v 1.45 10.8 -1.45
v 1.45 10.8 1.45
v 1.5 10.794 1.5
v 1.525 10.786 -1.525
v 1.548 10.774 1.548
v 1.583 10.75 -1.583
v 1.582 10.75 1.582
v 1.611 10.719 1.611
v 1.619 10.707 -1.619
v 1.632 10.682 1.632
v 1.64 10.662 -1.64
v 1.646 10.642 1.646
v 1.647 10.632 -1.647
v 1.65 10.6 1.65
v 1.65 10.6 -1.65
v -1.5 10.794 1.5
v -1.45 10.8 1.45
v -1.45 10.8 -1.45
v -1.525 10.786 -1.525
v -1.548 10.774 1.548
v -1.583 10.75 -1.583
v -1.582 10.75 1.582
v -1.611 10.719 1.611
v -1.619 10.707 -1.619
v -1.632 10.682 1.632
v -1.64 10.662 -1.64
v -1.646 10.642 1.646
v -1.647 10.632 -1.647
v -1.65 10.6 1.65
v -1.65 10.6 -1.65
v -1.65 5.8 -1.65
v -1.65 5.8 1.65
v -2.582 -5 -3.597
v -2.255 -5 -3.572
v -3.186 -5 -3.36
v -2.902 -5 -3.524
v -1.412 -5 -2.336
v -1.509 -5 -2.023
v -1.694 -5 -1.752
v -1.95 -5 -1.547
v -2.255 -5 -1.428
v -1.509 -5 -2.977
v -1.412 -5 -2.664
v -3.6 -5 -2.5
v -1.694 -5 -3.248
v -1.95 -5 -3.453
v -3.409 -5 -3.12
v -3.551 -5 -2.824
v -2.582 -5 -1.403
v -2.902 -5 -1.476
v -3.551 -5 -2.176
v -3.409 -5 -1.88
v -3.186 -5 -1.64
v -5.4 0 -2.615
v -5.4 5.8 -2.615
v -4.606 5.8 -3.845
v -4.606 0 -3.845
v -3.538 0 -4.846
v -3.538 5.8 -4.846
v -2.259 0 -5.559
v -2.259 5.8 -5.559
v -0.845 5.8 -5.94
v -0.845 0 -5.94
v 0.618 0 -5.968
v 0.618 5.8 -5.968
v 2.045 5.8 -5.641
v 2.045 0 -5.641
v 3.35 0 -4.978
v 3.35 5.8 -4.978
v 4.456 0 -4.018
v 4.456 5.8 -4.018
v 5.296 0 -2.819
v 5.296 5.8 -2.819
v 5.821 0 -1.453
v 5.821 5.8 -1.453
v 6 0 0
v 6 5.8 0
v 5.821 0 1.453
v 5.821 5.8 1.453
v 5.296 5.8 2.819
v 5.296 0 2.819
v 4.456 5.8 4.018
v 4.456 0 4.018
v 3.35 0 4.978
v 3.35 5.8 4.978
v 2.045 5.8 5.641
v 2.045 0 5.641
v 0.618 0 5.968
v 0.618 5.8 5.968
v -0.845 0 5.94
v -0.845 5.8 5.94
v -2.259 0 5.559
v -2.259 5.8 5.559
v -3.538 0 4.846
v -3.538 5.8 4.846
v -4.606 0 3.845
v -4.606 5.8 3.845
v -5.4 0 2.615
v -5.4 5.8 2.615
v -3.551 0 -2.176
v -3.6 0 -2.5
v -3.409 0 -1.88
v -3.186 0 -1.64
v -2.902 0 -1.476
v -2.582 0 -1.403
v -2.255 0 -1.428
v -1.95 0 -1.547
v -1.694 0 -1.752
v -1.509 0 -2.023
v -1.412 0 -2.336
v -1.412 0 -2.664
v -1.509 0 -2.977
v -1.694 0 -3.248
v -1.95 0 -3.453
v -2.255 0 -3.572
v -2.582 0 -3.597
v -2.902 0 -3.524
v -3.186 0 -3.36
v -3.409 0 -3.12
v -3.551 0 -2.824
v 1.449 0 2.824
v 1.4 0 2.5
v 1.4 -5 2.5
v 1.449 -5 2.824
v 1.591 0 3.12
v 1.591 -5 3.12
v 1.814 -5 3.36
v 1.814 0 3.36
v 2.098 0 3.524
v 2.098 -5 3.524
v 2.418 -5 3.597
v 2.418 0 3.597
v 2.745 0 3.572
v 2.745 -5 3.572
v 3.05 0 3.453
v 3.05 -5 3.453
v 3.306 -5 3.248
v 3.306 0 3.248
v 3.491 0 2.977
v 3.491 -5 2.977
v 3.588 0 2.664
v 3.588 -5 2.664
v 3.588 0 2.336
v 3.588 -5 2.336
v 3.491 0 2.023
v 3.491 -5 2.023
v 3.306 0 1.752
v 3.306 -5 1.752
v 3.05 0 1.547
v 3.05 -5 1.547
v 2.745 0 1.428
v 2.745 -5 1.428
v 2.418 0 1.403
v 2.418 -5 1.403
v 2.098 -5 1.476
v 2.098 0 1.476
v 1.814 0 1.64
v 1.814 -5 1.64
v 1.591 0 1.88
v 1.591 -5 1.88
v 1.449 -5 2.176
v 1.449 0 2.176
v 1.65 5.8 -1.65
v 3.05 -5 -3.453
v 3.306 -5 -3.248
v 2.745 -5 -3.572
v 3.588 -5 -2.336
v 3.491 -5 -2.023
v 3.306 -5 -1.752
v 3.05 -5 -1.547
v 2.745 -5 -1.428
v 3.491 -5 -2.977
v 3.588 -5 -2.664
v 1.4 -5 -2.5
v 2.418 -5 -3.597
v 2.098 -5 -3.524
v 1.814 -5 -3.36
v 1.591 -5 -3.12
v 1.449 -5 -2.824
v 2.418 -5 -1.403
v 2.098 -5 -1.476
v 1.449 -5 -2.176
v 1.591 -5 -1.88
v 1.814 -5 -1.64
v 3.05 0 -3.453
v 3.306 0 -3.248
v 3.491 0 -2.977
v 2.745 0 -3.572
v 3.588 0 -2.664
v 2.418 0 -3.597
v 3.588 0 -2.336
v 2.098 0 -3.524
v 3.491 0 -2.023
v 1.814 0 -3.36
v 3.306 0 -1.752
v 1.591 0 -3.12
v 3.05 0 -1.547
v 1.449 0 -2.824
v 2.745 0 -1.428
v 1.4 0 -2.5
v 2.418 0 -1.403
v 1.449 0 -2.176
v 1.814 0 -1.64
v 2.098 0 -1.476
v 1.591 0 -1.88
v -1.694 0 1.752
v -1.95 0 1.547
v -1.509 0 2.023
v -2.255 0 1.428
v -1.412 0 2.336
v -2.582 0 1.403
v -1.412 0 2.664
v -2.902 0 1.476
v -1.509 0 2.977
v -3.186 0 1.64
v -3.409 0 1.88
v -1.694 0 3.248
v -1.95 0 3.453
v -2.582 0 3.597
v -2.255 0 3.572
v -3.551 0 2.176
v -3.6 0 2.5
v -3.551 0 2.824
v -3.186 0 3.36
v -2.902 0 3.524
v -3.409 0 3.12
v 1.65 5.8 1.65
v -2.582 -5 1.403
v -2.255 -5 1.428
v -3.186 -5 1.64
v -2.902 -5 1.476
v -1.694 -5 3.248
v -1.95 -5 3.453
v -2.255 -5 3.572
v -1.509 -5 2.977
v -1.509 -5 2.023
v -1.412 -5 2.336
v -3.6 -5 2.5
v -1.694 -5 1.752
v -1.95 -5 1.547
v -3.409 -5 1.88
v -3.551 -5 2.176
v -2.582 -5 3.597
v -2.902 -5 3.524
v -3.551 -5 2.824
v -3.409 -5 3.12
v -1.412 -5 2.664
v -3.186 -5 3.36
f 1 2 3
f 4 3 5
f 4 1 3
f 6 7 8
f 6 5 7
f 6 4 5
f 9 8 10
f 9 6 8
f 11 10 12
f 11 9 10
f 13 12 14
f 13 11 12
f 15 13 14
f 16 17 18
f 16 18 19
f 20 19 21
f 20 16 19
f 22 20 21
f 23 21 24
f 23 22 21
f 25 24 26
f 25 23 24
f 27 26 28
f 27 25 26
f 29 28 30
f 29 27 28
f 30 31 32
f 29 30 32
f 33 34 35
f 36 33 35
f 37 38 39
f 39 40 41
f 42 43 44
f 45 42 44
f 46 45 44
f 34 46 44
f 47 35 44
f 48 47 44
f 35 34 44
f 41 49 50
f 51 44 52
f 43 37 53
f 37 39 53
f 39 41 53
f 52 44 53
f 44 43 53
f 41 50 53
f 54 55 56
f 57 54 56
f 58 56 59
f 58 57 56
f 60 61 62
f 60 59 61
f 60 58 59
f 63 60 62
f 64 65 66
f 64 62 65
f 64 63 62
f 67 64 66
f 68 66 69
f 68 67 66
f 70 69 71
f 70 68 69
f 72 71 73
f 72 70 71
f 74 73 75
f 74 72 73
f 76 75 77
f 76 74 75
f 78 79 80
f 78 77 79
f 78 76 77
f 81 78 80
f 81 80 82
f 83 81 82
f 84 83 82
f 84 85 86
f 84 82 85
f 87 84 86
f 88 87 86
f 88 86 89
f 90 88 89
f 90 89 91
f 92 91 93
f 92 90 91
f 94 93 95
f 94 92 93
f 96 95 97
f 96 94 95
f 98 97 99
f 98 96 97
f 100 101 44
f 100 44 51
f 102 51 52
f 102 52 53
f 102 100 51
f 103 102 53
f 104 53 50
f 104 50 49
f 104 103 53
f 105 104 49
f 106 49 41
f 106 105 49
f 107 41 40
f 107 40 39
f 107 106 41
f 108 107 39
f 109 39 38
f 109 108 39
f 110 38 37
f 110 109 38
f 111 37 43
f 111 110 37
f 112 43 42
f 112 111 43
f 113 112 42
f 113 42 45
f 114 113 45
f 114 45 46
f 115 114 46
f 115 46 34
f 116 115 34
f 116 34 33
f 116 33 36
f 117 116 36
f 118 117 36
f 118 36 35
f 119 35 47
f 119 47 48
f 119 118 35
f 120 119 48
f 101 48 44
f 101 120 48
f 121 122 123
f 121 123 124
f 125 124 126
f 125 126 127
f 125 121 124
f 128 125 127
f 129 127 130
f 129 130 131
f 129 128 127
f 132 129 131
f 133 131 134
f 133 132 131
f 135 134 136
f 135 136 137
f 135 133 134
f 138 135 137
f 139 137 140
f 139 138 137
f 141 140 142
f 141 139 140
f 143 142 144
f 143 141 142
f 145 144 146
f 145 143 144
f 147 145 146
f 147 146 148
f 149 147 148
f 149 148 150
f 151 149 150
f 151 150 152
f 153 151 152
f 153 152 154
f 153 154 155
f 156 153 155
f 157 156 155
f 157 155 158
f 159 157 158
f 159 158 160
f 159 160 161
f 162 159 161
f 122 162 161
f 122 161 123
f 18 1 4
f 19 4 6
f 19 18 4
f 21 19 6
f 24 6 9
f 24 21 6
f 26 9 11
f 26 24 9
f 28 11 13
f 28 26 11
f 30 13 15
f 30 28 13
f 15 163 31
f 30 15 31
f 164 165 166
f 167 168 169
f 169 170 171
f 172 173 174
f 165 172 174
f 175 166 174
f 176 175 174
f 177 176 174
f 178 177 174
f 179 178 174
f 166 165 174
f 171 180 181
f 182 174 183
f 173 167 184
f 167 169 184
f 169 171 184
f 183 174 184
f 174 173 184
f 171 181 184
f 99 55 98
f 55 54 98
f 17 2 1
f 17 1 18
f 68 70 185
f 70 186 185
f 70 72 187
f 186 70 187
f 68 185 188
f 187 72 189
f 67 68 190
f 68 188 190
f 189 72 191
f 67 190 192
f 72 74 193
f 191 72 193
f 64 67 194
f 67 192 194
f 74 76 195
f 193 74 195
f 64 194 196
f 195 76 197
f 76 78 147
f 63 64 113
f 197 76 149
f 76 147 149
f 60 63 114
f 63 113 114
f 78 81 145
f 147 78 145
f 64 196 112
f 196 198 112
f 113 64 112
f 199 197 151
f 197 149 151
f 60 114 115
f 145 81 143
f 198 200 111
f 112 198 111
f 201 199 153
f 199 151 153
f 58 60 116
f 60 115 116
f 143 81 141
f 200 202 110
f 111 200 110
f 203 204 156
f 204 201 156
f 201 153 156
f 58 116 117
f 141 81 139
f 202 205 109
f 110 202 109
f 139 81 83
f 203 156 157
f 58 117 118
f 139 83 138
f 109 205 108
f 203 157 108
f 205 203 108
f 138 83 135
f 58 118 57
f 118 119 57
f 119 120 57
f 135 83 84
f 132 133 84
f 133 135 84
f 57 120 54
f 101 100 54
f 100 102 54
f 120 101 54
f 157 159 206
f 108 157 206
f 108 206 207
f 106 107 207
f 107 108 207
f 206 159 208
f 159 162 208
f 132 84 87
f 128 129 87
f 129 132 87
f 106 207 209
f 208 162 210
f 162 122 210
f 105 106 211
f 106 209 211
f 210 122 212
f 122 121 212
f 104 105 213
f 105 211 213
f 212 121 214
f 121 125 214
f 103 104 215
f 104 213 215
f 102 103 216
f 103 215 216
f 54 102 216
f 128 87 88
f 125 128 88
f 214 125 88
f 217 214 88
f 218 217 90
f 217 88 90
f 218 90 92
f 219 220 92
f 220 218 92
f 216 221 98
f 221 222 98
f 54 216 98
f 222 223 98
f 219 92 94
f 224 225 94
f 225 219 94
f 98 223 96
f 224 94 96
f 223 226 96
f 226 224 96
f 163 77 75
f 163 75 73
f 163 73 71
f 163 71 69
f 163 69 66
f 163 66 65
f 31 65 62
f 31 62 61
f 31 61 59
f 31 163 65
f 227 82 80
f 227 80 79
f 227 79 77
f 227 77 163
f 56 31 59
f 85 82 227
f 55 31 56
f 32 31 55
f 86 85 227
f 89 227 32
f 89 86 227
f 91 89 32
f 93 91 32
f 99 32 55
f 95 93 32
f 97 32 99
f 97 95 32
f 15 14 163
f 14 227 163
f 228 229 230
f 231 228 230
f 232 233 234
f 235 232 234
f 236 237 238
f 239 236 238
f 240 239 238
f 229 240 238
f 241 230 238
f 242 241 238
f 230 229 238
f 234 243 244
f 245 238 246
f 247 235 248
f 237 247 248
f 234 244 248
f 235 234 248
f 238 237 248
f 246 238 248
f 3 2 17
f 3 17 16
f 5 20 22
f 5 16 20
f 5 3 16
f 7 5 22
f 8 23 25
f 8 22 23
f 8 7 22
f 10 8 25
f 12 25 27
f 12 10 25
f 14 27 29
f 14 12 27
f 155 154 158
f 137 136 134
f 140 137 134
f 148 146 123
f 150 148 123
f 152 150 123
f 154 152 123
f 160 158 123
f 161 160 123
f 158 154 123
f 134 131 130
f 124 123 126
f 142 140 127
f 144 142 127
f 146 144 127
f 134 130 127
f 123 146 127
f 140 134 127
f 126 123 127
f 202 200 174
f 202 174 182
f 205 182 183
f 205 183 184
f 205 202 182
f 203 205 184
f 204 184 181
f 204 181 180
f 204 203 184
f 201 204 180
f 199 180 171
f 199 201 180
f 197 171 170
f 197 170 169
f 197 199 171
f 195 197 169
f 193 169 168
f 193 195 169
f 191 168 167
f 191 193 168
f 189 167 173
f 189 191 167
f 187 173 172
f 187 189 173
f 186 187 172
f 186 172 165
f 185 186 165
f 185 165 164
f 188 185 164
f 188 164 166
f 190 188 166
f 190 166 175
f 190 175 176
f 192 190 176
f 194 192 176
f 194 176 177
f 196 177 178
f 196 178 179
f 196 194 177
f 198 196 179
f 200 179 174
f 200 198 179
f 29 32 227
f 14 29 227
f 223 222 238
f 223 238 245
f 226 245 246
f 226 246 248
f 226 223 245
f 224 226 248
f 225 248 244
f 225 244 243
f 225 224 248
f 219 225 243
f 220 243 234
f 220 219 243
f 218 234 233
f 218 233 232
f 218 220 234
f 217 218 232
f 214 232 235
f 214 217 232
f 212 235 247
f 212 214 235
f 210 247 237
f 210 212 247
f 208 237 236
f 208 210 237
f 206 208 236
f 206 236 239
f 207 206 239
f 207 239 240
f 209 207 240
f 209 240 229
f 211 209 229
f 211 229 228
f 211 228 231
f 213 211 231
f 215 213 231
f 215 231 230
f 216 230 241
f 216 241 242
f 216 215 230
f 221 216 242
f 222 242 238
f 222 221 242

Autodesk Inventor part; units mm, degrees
ref_plane "YZ Plane" through (0, 0, 0) normal (1, 0, 0) x (0, 1, 0)
ref_plane "XZ Plane" through (0, 0, 0) normal (0, 1, 0) x (-1, 0, 0)
ref_plane "XY Plane" through (0, 0, 0) normal (0, 0, 1) x (1, 0, 0)
sketch "Sketch1" plane through (0, 0, 0) normal (0, 1, 0) x (-1, 0, 0)
  arc A0 (5.4, 2.6153) -> (5.4, -2.6153) centre (0, 0) ccw
  line L0 (1.65, 1.65) -> (-1.65, 1.65)
  line L1 (-1.65, 1.65) -> (-1.65, -1.65)
  line L2 (-1.65, -1.65) -> (1.65, -1.65)
  line L3 (1.65, -1.65) -> (1.65, 1.65)
  line L4 (1.65, 1.65) -> (-1.65, -1.65) construction
  line L5 (-1.65, 1.65) -> (1.65, -1.65) construction
  line L6 (5.4, -2.6153) -> (5.4, 2.6153)
  circle A1 centre (2.5, 2.5) radius 1.1
  circle A2 centre (2.5, -2.5) radius 1.1
  circle A3 centre (-2.5, 2.5) radius 1.1
  circle A4 centre (-2.5, -2.5) radius 1.1
  point P0 (-6, 0)
  dimension "d0" = 12
  dimension "d1" = 3.3
  dimension "d2" = 3.3
  dimension "d3" = 11.4
  dimension "d4" = 2.2
  dimension "d7" = 5
  dimension "d10" = 5
extrude "Extrusion1" add sketch "Sketch1" along normal blind 5.8 contours L6 A0 | A1 | A2 | A3 | A4
extrude "Extrusion2" add sketch "Sketch1" along normal blind 10.8 contours L3 L2 L1 L0
extrude "Extrusion3" add sketch "Sketch1" against normal blind 5 contours A1 | A2 | A3 | A4
fillet "Fillet1" radius 0.2 4 edges at (0, 10.8, -1.65) (-1.65, 10.8, 0) (0, 10.8, 1.65) (1.65, 10.8, 0)
properties part number "D6L90 F1 LFS"
